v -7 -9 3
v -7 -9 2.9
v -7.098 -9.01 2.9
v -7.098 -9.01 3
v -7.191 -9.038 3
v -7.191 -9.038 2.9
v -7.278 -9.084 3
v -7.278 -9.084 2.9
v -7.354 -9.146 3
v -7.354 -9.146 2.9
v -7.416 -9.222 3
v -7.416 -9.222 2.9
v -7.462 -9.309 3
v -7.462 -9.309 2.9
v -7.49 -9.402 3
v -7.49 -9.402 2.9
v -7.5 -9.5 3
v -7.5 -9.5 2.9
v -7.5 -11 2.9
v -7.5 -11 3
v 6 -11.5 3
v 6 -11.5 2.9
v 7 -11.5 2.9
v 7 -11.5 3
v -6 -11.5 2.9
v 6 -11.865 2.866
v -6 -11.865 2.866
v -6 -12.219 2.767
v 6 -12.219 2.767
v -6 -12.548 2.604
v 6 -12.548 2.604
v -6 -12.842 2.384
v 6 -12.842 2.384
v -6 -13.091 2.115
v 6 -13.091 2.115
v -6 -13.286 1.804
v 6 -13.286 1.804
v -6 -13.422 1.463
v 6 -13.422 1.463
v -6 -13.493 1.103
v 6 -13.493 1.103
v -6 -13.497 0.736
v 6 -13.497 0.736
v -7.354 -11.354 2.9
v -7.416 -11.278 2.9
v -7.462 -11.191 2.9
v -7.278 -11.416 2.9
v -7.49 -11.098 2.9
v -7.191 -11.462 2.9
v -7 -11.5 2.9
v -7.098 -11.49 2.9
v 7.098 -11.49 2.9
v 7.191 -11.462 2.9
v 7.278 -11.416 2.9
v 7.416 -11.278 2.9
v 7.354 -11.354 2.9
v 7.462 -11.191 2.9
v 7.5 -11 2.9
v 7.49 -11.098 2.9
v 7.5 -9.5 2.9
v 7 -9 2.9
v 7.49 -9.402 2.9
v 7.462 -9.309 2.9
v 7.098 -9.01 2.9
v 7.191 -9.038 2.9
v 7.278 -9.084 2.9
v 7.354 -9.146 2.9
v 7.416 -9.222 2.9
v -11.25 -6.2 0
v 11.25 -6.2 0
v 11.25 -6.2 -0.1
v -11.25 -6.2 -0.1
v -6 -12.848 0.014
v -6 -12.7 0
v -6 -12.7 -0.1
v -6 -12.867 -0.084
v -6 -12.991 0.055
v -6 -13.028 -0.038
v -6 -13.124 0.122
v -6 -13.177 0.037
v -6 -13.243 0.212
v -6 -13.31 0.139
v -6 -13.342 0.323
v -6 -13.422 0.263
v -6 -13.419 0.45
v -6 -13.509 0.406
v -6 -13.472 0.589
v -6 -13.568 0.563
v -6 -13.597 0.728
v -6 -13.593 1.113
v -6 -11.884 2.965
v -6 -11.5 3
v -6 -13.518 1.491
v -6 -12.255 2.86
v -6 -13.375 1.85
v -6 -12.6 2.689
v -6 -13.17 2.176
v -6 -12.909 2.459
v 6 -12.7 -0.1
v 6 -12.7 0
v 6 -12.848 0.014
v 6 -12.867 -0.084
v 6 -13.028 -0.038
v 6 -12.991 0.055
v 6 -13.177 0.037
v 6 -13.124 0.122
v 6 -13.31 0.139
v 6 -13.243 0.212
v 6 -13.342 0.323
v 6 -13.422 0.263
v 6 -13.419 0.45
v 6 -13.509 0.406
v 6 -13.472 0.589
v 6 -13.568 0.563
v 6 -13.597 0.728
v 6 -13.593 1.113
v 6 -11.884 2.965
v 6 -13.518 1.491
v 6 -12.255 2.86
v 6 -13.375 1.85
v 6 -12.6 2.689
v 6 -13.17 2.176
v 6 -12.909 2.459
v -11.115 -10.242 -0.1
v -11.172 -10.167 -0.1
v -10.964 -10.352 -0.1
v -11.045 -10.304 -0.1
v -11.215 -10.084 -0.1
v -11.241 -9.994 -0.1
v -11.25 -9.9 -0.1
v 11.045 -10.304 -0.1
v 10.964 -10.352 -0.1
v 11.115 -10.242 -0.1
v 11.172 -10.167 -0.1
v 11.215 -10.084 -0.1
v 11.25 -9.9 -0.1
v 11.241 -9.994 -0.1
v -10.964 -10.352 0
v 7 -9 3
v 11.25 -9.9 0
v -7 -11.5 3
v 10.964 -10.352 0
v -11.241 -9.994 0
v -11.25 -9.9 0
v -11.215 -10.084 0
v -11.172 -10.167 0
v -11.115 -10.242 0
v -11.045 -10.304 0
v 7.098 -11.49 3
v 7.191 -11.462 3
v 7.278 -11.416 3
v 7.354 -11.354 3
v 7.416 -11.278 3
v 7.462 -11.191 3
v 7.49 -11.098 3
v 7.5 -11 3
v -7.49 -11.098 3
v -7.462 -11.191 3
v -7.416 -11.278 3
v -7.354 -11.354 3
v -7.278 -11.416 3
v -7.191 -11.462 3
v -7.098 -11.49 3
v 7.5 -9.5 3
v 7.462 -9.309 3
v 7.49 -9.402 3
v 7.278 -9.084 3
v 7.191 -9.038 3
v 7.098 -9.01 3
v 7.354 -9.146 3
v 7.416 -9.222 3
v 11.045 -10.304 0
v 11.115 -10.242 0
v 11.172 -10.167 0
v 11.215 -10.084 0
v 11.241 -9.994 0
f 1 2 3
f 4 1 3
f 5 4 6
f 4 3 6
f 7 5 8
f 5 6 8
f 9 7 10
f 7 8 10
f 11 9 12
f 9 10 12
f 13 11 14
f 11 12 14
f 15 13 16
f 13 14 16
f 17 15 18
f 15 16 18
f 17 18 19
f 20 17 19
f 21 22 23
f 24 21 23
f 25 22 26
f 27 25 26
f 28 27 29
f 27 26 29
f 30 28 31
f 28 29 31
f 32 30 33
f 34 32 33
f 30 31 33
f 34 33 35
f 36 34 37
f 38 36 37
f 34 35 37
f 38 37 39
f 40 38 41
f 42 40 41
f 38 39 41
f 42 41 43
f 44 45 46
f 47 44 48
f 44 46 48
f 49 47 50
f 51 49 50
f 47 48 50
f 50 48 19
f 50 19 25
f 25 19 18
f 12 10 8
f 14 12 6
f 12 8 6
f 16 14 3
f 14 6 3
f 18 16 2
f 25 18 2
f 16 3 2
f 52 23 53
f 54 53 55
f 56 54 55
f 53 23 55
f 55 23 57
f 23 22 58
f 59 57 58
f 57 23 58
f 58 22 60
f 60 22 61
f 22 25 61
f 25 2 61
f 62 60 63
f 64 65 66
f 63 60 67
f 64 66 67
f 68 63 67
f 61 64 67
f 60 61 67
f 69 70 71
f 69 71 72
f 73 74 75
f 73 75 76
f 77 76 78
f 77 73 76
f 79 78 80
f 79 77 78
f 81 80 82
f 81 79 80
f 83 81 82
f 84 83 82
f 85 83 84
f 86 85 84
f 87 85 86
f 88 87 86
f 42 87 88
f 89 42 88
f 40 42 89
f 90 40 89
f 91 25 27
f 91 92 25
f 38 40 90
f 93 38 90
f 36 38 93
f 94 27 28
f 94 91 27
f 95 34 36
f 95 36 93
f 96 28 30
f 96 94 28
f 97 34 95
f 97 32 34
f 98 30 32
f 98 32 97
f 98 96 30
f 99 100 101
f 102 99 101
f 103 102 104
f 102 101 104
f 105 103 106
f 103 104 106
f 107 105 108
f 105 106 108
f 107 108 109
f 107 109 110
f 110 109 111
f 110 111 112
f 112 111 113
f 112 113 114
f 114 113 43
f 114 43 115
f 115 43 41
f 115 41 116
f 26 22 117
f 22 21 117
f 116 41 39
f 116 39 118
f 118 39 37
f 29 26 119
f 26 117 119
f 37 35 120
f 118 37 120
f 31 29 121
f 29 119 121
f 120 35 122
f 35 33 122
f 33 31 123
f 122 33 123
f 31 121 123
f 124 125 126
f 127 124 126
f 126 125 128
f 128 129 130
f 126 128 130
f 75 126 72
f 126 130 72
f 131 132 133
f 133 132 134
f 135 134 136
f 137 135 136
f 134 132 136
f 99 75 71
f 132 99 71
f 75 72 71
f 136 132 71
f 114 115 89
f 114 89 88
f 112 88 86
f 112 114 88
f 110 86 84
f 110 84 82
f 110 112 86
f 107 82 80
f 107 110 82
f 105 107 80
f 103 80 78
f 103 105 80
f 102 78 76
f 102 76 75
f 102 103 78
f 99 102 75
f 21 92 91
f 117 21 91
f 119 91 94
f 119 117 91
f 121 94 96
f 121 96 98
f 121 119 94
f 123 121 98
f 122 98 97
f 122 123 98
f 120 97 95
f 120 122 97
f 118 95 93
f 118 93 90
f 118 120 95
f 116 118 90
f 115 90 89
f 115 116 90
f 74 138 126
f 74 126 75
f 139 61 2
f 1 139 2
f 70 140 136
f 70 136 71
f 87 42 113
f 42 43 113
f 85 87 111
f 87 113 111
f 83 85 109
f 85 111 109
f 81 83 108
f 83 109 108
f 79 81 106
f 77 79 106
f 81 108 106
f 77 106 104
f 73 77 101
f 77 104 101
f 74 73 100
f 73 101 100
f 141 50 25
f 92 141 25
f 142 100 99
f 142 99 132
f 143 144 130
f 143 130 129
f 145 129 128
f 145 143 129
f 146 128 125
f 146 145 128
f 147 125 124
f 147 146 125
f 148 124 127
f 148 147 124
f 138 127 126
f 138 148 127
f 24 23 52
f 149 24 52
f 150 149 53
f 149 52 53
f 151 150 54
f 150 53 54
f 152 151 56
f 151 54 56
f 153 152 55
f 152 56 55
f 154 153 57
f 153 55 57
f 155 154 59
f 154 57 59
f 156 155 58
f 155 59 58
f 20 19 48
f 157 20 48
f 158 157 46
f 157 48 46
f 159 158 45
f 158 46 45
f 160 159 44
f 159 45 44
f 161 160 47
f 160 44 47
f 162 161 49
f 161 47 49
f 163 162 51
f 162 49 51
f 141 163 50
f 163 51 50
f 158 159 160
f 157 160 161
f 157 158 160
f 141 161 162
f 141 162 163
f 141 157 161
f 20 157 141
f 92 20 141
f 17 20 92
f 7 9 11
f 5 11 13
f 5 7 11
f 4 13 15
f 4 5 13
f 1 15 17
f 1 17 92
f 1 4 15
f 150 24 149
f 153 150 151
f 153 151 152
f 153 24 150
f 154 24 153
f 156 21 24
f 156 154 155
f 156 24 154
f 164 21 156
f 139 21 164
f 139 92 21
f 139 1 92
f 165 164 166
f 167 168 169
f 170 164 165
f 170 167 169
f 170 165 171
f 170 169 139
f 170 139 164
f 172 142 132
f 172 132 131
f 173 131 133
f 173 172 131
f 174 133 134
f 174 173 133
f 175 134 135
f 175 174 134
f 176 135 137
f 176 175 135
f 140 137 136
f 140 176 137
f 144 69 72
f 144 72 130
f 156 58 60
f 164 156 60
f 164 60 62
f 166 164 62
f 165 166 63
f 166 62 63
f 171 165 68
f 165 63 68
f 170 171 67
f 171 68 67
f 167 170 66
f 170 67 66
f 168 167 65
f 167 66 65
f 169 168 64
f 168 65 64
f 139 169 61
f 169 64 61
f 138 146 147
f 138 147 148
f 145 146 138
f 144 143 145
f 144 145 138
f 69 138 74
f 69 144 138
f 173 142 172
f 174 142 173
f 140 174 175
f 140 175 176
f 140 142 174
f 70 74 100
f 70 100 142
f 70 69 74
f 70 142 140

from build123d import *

# Parameters (mm, degrees)
PAD025_DEPTH = 6
PAD026_DEPTH = 0.1
PAD027_DEPTH = 0.1


with BuildPart() as part:
    # Sketch003 → Pad025 (new body, symmetric)
    with BuildSketch(Plane.YZ):
        with BuildLine():
            ThreePointArc((-11.5, 2.9), (-12.972433, 2.255323), (-13.497444, 0.736102))
            ThreePointArc((-13.497444, 0.736102), (-13.242624, 0.212157), (-12.7, 0))
            Line((-12.7, 0), (-12.7, -0.1))
            ThreePointArc((-13.597125, 0.728115), (-13.310452, 0.138677), (-12.7, -0.1))
            ThreePointArc((-11.5, 3), (-13.045913, 2.323151), (-13.597125, 0.728115))
            Line((-11.5, 2.9), (-11.5, 3))
        make_face()
    extrude(amount=PAD025_DEPTH, both=True)

    # Sketch004 → Pad026 (join)
    with BuildSketch(Plane.XY.offset(2.9)):
        with BuildLine():
            Line((-7.5, -9.5), (-7.5, -11))
            ThreePointArc((-7.5, -11), (-7.353553, -11.353553), (-7, -11.5))
            Line((-7, -11.5), (7, -11.5))
            ThreePointArc((7, -11.5), (7.353553, -11.353553), (7.5, -11))
            Line((7.5, -11), (7.5, -9.5))
            ThreePointArc((7.5, -9.5), (7.353553, -9.146447), (7, -9))
            Line((7, -9), (-7, -9))
            ThreePointArc((-7, -9), (-7.353553, -9.146447), (-7.5, -9.5))
        make_face()
    extrude(amount=PAD026_DEPTH)

    # Sketch063 → Pad027 (join)
    with BuildSketch(Plane.XY):
        with BuildLine():
            Line((-6, -12.7), (6, -12.7))
            Line((6, -12.7), (10.963801, -10.351984))
            ThreePointArc((10.963801, -10.351984), (11.172434, -10.167488), (11.25, -9.9))
            Line((11.25, -9.9), (11.25, -6.2))
            Line((11.25, -6.2), (-11.25, -6.2))
            Line((-11.25, -6.2), (-11.25, -9.9))
            ThreePointArc((-11.25, -9.9), (-11.172434, -10.167488), (-10.963801, -10.351984))
            Line((-10.963801, -10.351984), (-6, -12.7))
        make_face()
    extrude(amount=-PAD027_DEPTH)


solid = part.part
